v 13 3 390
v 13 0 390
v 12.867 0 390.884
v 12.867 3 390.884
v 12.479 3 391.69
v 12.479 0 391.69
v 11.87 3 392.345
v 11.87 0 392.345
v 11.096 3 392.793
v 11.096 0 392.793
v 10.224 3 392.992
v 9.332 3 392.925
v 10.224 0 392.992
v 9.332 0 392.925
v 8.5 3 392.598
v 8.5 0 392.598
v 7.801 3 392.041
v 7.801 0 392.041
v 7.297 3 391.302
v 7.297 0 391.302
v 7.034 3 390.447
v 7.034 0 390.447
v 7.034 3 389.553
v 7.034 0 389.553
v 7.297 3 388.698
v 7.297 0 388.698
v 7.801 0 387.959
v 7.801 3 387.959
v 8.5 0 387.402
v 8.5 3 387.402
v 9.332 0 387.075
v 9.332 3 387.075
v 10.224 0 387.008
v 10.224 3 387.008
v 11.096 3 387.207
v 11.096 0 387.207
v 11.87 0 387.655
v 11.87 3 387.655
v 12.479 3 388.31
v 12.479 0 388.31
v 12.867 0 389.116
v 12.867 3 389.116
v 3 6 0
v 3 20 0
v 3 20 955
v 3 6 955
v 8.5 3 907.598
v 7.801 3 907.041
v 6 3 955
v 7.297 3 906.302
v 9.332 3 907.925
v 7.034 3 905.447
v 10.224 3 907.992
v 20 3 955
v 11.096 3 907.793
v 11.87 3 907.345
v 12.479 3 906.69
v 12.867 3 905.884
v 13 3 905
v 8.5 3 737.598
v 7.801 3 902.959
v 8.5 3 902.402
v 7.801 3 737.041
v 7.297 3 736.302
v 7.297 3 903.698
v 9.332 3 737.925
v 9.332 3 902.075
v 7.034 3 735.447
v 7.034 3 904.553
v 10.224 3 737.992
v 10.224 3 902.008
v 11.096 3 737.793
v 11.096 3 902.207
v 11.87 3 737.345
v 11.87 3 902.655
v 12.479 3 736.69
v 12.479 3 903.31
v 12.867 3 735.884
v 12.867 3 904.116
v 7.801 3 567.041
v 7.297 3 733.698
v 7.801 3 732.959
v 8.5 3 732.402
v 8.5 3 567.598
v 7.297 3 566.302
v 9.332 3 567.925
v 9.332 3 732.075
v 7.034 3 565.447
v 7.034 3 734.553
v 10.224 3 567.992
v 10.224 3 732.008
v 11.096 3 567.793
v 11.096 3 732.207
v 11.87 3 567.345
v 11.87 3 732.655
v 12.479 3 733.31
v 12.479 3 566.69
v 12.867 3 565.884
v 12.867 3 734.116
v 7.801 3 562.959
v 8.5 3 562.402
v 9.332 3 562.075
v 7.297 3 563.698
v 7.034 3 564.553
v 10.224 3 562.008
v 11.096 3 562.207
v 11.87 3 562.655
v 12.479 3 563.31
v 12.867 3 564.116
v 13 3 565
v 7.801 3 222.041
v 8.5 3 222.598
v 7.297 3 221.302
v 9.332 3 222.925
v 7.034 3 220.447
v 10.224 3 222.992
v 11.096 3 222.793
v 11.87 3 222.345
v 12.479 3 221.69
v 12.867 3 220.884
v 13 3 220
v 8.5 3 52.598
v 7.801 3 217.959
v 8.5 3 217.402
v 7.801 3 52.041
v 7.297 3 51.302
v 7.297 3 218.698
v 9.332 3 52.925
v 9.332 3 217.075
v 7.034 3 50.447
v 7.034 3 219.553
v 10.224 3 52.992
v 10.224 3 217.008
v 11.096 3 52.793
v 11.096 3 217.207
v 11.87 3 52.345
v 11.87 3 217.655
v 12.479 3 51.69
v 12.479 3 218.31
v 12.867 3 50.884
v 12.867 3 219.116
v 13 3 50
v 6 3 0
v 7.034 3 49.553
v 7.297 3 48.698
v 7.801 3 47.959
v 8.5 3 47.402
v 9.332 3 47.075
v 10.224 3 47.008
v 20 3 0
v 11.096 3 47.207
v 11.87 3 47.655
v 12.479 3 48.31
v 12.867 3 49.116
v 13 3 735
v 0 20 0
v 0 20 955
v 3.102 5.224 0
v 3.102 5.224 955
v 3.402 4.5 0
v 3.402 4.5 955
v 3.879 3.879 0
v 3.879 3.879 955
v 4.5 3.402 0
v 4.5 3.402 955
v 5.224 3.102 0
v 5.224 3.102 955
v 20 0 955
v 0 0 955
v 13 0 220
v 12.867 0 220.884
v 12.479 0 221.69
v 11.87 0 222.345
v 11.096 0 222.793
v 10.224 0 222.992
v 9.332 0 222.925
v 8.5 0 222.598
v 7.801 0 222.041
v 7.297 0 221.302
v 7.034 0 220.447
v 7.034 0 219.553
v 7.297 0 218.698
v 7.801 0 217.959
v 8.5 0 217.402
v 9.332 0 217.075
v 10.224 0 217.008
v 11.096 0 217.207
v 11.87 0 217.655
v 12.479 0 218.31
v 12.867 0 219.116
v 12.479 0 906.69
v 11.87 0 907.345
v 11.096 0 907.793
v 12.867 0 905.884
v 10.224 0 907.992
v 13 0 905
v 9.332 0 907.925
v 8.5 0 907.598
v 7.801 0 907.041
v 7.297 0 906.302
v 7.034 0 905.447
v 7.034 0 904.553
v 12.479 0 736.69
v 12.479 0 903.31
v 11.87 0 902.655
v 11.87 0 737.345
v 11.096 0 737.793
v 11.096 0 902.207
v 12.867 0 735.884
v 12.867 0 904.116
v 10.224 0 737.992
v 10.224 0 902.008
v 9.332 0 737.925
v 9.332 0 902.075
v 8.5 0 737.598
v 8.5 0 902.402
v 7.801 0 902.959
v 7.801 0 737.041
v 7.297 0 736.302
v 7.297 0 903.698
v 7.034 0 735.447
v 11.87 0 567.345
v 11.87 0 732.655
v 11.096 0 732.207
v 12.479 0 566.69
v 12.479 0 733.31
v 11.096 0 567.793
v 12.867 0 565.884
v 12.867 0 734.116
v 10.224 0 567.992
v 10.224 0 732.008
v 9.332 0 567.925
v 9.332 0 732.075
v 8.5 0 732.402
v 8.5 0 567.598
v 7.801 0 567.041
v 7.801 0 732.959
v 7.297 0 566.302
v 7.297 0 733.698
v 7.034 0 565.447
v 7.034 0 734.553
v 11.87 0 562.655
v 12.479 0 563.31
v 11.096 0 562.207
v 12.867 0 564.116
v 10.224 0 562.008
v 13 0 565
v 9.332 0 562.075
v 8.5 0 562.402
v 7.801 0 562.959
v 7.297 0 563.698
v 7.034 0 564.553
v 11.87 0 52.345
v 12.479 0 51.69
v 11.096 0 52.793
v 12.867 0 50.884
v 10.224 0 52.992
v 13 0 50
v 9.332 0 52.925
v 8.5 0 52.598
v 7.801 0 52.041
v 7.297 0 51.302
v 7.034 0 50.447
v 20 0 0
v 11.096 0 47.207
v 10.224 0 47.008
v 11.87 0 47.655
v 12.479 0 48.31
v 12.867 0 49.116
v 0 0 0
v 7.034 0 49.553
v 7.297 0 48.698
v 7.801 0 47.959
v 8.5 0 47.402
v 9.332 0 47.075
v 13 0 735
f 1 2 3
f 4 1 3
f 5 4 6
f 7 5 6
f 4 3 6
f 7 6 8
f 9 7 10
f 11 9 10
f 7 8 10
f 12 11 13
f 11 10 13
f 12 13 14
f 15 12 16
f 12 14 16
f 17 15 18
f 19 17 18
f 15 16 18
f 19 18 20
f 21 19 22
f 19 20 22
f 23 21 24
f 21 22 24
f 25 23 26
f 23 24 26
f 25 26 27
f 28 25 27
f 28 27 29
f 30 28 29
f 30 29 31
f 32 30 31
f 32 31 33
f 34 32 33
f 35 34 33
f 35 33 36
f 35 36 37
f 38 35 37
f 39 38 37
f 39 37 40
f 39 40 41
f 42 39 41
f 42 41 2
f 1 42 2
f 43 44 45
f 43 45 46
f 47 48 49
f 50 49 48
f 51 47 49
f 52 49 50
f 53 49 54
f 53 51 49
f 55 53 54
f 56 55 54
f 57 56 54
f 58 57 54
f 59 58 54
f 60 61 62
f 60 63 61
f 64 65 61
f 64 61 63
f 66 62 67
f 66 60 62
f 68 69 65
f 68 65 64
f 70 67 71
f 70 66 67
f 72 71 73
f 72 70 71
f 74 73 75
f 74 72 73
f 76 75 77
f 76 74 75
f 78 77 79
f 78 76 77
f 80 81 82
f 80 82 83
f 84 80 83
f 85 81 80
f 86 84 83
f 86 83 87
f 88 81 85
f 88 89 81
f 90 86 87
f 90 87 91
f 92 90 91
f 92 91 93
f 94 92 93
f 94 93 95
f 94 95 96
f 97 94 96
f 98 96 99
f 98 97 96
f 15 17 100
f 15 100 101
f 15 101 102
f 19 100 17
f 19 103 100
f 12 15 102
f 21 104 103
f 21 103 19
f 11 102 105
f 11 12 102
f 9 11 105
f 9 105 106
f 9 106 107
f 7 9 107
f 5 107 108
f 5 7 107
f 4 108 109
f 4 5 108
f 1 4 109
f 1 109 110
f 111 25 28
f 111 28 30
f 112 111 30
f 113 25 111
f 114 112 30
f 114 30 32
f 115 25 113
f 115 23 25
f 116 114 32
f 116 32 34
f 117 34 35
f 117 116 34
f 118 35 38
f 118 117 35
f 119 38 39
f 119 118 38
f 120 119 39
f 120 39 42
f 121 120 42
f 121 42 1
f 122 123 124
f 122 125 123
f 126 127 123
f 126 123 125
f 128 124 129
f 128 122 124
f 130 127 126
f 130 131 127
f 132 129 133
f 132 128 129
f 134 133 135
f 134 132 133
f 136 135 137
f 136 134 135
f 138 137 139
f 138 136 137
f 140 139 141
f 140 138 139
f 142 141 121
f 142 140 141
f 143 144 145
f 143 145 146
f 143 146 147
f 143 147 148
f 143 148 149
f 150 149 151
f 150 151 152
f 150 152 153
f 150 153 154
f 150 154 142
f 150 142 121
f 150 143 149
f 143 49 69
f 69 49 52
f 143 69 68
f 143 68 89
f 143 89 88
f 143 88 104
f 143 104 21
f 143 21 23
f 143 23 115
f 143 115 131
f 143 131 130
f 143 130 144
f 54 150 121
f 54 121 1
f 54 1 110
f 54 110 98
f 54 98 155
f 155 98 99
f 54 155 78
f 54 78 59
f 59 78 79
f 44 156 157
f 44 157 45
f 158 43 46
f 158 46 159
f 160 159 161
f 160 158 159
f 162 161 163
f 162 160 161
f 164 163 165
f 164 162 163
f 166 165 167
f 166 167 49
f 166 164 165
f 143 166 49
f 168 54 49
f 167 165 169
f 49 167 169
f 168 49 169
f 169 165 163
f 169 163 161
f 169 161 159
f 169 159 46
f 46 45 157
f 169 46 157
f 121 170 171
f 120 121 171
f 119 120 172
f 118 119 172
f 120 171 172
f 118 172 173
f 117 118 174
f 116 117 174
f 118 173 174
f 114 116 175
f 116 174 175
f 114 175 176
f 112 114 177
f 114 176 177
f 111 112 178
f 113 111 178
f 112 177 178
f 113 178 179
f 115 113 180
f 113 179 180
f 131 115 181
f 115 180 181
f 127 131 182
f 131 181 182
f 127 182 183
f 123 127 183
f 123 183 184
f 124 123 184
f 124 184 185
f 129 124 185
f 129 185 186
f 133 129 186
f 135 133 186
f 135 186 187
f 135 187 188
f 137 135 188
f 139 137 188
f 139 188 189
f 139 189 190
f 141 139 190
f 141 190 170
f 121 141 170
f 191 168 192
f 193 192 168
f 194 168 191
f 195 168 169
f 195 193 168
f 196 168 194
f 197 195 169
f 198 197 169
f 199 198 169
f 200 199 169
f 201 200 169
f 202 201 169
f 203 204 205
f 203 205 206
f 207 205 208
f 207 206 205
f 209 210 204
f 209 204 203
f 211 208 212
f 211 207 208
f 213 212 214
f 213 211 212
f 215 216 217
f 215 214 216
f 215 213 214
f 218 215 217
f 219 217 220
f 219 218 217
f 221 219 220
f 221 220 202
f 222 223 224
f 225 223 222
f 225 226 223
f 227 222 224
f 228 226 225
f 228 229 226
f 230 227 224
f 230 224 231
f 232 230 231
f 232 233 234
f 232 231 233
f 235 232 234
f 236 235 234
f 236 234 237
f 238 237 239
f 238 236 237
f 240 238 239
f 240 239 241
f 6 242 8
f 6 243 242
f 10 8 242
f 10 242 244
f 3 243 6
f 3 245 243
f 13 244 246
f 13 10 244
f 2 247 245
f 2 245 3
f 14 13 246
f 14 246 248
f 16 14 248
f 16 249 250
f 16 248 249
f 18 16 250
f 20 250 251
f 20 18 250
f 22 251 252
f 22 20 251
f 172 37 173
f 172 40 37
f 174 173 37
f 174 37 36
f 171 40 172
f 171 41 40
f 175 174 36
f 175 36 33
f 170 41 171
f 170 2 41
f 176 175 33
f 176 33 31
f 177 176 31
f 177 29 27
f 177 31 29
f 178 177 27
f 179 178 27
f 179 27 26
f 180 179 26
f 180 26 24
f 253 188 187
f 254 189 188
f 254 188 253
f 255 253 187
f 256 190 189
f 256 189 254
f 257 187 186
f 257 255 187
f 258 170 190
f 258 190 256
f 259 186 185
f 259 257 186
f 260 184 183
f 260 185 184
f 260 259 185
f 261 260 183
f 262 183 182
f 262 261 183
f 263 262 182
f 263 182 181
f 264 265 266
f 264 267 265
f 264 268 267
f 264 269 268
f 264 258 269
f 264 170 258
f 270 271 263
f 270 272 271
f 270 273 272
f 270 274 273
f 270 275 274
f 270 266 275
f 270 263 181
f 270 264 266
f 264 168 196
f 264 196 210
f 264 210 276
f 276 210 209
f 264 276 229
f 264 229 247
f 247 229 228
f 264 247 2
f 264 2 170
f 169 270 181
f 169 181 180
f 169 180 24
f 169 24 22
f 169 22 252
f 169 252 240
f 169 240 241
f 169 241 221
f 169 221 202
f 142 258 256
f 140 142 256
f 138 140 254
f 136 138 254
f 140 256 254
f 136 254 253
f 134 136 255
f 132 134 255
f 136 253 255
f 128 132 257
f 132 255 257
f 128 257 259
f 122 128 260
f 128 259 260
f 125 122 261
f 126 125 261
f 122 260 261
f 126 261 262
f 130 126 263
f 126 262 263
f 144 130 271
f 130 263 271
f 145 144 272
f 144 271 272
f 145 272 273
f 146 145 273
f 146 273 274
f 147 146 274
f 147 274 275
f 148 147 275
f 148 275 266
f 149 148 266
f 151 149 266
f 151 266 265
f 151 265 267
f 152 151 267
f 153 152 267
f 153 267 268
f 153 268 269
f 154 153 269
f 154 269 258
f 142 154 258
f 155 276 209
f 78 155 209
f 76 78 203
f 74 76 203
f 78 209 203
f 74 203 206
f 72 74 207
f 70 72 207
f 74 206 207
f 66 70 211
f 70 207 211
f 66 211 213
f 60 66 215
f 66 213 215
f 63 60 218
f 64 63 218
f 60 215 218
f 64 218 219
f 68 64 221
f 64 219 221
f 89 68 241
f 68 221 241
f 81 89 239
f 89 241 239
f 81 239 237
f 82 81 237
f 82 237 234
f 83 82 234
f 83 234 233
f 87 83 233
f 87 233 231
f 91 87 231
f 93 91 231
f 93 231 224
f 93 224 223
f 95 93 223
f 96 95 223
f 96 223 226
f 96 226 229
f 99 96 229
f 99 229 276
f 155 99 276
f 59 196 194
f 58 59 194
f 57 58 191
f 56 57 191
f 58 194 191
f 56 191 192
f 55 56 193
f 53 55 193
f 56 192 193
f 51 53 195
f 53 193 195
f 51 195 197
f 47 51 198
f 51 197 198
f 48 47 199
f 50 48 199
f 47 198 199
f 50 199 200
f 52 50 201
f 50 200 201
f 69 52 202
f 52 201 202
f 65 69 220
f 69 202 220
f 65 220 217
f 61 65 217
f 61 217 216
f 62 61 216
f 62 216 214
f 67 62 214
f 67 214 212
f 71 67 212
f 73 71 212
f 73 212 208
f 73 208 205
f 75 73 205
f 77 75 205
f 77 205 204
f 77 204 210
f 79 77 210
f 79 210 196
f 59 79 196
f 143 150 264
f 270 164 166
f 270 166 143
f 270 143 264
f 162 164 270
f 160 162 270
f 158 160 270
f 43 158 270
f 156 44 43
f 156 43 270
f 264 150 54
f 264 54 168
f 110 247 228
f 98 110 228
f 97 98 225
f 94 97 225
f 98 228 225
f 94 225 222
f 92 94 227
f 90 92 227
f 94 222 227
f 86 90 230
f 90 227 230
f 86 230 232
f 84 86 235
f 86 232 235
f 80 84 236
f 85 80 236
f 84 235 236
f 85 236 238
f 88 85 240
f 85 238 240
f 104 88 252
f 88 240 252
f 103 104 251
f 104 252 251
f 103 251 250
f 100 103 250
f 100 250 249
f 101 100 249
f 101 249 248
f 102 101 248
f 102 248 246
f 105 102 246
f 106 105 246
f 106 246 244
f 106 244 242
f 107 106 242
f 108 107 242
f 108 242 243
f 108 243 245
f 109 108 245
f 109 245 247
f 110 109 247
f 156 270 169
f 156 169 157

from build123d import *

# Parameters (mm, degrees)
BOSS_EXTRU_1_DEPTH      = 955
ESQUISSE2_R             = 3
ENL_V_MAT_EXTRU_1_DEPTH = 955


with BuildPart() as part:
    # Esquisse1 → Boss.-Extru.1 (new body)
    with BuildSketch(Plane.XY):
        with BuildLine():
            Line((0, 0), (0, 20))
            Line((0, 20), (3, 20))
            Line((3, 20), (3, 6))
            ThreePointArc((3, 6), (3.878679656, 3.878679656), (6, 3))
            Line((6, 3), (20, 3))
            Line((20, 3), (20, 0))
            Line((20, 0), (0, 0))
        make_face()
    extrude(amount=BOSS_EXTRU_1_DEPTH)

    # Esquisse2 → Enlèv. mat.-Extru.1 (cut)
    with BuildSketch(Plane(origin=(0, 0, 0), x_dir=(-1, 0, 0), z_dir=(0, -1, 0))):
        with Locations(Location((-10, -50, 0), (0, 0, 180))):
            Circle(ESQUISSE2_R)
        with Locations(Location((-10, -905, 0), (0, 0, 180))):
            Circle(ESQUISSE2_R)
        with Locations(Location((-10, -220, 0), (0, 0, 180))):
            Circle(ESQUISSE2_R)
        with Locations(Location((-10, -735, 0), (0, 0, 180))):
            Circle(ESQUISSE2_R)
        with Locations(Location((-10, -390, 0), (0, 0, 180))):
            Circle(ESQUISSE2_R)
        with Locations(Location((-10, -565, 0), (0, 0, 180))):
            Circle(ESQUISSE2_R)
    extrude(amount=-ENL_V_MAT_EXTRU_1_DEPTH, mode=Mode.SUBTRACT)


solid = part.part
